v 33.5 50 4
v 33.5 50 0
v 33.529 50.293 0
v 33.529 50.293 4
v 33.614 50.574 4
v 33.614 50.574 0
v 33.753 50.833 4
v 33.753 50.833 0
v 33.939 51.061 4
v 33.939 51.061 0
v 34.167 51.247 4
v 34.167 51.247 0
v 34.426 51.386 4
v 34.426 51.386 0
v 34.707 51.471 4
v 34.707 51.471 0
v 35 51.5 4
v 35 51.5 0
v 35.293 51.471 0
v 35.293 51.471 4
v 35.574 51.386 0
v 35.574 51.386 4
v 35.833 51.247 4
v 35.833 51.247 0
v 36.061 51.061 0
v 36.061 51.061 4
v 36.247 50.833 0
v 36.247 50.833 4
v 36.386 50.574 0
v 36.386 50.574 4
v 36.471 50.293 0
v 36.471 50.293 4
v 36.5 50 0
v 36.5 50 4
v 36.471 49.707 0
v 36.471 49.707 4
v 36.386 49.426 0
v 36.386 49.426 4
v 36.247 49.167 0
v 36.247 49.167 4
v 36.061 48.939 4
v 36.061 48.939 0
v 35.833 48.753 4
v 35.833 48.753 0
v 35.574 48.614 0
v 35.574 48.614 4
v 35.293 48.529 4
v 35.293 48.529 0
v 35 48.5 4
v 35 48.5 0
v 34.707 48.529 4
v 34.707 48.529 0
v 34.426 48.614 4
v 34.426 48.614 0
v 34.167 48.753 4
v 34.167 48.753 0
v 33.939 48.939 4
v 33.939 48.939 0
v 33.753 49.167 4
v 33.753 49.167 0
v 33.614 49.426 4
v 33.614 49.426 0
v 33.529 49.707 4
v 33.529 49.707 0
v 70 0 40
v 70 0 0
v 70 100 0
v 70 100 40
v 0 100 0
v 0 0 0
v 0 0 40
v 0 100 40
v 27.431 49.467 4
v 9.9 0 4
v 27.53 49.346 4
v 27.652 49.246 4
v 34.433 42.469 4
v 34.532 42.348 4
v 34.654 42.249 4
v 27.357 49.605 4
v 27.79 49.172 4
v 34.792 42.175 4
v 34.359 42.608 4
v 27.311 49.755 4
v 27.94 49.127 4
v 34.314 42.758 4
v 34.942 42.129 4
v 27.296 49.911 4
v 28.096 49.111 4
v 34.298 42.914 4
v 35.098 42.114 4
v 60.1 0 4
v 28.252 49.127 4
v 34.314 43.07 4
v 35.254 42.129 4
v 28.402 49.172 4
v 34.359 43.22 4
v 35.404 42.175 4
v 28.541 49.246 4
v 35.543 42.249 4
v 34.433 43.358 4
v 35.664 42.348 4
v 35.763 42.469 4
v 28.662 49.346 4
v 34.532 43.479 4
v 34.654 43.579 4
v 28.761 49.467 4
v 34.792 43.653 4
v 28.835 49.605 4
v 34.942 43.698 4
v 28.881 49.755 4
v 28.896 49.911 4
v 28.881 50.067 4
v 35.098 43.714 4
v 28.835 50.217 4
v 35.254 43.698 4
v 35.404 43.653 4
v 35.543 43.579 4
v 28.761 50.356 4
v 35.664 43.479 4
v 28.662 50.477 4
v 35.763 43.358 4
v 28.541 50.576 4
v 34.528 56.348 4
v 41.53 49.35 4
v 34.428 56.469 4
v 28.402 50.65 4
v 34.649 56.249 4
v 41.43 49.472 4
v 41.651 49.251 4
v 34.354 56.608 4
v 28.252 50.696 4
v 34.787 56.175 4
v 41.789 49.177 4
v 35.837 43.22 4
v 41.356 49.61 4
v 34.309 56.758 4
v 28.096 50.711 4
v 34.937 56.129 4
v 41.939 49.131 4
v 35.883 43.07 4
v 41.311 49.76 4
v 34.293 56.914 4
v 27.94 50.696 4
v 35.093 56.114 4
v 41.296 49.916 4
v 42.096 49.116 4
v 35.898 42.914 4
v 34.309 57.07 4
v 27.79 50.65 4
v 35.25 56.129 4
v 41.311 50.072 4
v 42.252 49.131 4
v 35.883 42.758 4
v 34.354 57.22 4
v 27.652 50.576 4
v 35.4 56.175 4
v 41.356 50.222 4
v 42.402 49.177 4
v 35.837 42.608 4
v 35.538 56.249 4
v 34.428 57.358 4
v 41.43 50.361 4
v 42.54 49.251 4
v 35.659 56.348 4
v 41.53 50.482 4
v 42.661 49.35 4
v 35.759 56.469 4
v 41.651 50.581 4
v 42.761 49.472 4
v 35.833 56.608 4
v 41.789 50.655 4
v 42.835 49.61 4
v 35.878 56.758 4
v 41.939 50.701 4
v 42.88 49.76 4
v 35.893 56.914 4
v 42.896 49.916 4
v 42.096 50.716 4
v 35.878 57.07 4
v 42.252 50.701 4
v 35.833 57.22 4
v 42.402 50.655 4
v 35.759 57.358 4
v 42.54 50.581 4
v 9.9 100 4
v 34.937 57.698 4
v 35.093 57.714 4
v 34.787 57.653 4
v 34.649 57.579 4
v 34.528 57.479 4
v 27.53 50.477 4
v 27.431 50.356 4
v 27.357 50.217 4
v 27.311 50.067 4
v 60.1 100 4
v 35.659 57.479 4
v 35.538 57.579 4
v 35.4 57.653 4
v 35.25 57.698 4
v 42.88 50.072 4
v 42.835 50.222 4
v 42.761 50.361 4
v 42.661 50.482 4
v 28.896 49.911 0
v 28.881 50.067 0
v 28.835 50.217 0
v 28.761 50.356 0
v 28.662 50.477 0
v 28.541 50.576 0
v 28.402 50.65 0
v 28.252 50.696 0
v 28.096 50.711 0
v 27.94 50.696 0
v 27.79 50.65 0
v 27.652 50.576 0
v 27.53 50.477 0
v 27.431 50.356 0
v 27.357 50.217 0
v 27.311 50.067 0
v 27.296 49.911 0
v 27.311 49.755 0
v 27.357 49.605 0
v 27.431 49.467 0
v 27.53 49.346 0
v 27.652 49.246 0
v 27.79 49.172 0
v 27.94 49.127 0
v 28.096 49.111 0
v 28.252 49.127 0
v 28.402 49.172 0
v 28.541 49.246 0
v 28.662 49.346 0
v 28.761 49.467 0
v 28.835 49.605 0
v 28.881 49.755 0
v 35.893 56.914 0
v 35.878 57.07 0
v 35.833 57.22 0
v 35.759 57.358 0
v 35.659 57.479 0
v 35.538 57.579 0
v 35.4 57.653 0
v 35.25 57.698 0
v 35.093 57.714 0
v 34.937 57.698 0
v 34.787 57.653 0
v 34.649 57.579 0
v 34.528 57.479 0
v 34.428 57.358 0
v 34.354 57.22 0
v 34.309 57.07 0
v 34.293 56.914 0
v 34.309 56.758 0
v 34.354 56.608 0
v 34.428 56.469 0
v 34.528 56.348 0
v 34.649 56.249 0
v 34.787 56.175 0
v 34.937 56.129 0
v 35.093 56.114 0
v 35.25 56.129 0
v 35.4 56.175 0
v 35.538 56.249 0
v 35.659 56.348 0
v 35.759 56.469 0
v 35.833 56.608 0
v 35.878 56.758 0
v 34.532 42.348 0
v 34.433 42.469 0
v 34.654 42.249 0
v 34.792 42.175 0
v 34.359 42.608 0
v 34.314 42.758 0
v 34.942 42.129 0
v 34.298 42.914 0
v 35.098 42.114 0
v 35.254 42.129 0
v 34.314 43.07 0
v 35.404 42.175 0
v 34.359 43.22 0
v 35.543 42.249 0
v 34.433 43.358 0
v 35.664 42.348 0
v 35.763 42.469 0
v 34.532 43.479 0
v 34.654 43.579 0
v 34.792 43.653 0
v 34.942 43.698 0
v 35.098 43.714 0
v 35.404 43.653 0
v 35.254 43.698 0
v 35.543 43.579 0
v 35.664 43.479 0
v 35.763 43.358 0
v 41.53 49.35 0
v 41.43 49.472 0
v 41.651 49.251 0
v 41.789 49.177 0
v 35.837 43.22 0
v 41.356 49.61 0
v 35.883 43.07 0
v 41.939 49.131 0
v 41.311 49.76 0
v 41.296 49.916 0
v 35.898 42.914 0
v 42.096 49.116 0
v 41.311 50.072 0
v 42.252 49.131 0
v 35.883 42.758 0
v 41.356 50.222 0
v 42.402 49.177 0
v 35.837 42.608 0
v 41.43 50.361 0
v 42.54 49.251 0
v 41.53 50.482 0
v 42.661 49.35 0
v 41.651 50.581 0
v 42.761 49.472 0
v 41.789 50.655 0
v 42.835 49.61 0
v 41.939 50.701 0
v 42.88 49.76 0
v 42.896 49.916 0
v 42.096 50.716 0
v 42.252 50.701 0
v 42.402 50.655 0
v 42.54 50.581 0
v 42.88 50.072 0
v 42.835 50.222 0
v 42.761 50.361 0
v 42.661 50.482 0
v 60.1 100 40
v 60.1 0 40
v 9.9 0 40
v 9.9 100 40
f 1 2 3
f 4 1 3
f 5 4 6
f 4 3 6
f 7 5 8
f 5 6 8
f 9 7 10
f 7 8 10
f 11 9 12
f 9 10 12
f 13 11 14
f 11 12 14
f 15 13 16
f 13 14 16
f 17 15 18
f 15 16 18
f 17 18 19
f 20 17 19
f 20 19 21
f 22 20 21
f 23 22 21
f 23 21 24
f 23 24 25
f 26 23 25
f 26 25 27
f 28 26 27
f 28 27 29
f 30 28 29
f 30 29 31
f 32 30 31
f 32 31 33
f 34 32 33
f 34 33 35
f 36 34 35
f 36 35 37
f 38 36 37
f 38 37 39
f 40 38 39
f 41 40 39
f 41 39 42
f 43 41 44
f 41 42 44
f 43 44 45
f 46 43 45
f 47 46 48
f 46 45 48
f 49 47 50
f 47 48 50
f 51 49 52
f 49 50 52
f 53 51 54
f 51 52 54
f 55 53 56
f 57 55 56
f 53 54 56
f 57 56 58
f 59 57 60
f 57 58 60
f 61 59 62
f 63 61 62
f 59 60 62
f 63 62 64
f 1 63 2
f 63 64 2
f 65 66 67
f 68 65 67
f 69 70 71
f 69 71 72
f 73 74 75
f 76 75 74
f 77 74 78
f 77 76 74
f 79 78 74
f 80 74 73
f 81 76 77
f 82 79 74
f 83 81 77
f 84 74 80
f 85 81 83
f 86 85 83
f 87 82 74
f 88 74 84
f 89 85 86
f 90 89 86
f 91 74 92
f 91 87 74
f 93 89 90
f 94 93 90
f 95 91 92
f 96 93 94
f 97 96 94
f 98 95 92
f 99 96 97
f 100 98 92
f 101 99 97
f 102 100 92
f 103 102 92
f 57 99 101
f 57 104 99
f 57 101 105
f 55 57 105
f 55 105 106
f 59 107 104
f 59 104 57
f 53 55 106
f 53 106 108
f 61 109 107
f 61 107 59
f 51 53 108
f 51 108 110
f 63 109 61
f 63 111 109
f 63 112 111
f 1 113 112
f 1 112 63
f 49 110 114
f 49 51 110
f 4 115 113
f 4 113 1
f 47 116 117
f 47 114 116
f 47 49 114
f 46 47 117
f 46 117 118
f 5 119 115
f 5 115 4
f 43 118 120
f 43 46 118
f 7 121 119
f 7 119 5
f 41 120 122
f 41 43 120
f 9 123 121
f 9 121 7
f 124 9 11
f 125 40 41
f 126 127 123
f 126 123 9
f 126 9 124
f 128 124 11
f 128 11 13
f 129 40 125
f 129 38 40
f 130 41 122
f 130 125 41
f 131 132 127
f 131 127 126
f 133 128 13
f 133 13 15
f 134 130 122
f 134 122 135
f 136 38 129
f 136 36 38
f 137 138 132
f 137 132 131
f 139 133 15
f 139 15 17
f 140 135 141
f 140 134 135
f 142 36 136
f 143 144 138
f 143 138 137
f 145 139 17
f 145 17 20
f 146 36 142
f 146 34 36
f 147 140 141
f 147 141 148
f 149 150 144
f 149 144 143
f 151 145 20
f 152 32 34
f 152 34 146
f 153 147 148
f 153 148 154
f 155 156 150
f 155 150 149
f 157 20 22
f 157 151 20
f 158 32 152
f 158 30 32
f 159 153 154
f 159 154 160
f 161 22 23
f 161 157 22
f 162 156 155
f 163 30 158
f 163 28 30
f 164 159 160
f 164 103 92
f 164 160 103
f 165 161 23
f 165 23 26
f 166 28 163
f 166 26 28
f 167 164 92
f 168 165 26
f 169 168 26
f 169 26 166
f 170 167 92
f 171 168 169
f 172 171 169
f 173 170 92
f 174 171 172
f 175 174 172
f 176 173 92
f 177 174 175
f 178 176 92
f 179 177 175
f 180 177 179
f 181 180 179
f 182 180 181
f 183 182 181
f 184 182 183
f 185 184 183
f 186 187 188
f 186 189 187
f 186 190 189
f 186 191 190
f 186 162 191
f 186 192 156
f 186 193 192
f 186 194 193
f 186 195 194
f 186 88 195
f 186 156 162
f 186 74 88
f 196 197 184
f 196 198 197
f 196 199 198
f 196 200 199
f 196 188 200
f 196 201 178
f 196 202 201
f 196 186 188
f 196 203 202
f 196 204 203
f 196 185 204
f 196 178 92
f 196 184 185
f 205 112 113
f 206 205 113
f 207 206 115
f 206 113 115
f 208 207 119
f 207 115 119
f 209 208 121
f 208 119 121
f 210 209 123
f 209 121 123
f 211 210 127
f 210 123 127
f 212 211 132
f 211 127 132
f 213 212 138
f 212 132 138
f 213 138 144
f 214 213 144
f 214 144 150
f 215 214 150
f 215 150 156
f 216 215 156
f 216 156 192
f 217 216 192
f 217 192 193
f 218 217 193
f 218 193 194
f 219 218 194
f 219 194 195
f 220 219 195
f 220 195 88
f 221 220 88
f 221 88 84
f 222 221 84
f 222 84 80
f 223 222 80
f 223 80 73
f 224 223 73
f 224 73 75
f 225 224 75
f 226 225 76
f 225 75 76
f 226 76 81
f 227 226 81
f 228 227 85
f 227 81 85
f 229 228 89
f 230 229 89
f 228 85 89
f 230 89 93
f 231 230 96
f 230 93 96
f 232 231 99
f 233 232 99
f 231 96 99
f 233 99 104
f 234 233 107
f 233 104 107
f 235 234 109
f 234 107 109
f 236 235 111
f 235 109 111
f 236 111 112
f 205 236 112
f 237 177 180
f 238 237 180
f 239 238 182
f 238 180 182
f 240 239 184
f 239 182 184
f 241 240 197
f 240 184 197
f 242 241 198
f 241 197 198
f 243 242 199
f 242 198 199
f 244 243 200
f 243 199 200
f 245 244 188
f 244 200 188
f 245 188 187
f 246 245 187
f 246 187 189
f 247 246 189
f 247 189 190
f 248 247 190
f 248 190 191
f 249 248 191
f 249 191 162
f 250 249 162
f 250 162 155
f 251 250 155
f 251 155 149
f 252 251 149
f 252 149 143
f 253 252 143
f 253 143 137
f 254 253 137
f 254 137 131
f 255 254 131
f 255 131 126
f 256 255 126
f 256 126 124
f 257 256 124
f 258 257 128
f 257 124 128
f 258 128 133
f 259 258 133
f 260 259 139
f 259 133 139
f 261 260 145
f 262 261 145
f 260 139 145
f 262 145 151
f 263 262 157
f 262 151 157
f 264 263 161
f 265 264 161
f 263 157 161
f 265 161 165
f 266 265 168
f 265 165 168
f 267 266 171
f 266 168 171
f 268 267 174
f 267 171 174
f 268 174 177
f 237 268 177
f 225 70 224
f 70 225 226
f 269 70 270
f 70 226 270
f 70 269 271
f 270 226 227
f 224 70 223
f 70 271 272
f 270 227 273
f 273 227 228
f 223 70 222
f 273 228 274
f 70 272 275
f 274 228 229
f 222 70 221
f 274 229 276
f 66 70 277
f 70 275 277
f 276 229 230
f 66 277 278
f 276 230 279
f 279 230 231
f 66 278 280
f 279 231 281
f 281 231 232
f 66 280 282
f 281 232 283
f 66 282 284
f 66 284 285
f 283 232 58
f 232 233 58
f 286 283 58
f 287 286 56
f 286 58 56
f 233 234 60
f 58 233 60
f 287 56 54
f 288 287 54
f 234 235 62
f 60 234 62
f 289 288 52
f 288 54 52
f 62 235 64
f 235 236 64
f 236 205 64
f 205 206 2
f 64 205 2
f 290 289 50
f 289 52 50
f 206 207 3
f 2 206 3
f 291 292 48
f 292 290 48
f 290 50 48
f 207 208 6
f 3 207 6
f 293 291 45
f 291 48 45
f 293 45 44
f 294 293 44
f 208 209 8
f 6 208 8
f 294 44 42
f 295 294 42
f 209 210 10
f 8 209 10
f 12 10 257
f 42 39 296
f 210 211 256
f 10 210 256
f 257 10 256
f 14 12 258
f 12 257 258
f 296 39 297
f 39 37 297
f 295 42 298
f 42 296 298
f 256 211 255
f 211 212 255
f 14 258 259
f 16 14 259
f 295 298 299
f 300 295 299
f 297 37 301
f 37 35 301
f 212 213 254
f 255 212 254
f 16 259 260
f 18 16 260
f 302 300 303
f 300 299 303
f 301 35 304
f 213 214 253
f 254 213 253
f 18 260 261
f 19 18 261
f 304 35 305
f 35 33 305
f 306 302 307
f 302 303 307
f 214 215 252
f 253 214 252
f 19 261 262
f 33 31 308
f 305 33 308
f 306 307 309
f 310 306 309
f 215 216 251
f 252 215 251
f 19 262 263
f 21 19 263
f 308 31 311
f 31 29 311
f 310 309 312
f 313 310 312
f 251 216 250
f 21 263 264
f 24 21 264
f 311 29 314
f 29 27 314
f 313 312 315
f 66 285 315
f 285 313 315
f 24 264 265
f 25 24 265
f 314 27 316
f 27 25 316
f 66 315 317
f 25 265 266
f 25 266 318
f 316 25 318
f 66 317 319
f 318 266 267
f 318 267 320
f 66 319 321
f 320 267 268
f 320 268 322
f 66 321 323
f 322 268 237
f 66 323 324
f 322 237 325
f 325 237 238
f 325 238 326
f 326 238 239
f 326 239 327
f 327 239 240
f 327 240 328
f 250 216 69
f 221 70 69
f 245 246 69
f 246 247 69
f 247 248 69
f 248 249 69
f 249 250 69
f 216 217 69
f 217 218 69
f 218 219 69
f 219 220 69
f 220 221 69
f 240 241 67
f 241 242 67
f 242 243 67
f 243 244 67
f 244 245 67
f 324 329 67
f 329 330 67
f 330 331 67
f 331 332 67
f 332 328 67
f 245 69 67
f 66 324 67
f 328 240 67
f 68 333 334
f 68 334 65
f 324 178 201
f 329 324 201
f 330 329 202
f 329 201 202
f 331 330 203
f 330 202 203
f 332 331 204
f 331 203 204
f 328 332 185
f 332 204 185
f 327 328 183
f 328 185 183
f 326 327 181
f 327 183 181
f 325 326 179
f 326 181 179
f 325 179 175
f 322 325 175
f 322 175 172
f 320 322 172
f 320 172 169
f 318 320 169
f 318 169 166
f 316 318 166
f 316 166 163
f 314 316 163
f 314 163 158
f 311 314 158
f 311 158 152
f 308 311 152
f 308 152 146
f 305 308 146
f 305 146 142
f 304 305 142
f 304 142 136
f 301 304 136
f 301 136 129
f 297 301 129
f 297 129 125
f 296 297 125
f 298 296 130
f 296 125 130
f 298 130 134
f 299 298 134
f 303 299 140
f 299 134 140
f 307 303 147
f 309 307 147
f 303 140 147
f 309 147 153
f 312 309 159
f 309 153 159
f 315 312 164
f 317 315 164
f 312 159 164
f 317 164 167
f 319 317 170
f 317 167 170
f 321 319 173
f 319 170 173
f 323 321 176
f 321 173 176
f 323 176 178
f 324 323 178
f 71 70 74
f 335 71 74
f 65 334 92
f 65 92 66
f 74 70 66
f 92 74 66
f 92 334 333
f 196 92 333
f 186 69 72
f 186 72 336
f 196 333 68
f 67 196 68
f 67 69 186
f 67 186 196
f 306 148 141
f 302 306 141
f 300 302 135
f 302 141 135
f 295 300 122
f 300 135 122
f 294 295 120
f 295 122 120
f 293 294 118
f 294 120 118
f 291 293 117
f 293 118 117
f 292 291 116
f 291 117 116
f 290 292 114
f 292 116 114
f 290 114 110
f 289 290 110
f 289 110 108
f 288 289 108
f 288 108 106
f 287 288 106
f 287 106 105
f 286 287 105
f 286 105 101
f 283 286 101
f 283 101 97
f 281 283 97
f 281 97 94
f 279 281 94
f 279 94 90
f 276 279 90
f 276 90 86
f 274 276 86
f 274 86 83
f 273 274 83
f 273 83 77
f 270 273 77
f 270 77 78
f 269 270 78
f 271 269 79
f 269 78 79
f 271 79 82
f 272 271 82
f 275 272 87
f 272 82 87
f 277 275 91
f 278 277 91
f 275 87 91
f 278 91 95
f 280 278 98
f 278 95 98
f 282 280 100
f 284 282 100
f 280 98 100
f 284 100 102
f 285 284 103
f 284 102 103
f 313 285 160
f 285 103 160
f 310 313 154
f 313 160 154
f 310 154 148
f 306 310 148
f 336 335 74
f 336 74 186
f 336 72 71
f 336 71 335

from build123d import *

# Parameters (mm, degrees)
SKETCH_1_W          = 70
SKETCH_1_H          = 100
EXTRUDE_1_DEPTH     = 40
SKETCH_2_W          = 50.2
SKETCH_2_H          = 100
CUT_EXTRUDE_1_DEPTH = 36
CUT_EXTRUDE_2_REACH = 130.452
SKETCH_3_R          = 1.5
CUT_EXTRUDE_4_REACH = 129.264
SKETCH_6_R          = 0.799974648
SKETCH_6_R_2        = 0.799973527
SKETCH_6_R_3        = 0.799971754
SKETCH_6_R_4        = 0.799972464


with BuildPart() as part:
    # 草图1 → 凸台-拉伸1 (new body)
    with BuildSketch(Plane.XY):
        with Locations((35, 50)):
            Rectangle(SKETCH_1_W, SKETCH_1_H)
    extrude(amount=EXTRUDE_1_DEPTH)

    # 草图2 → 切除-拉伸1 (cut)
    with BuildSketch(Plane.XY.offset(40)):
        with Locations((35, 50)):
            Rectangle(SKETCH_2_W, SKETCH_2_H)
    extrude(amount=-CUT_EXTRUDE_1_DEPTH, mode=Mode.SUBTRACT)

    # 草图3 → 切除-拉伸2 (cut, up to next)
    with BuildSketch(Plane(origin=(0, 0, 0), x_dir=(-1, 0, 0), z_dir=(0, 0, -1)), mode=Mode.PRIVATE) as cut_extrude_2_sk1:
        with Locations((-35, 50)):
            Circle(SKETCH_3_R)
    cut_extrude_2_tool1 = extrude(cut_extrude_2_sk1.sketch, amount=-CUT_EXTRUDE_2_REACH, mode=Mode.PRIVATE) & part.part
    add(cut_extrude_2_tool1.solids().sort_by_distance((35, 50, 0))[0], mode=Mode.SUBTRACT)

    # 草图6 → 切除-拉伸4 (cut, up to next)
    with BuildSketch(Plane.XY.offset(4), mode=Mode.PRIVATE) as cut_extrude_4_sk1:
        with Locations((35.098154463, 42.913706308)):
            Circle(SKETCH_6_R)
    cut_extrude_4_tool1 = extrude(cut_extrude_4_sk1.sketch, amount=-CUT_EXTRUDE_4_REACH, mode=Mode.PRIVATE) & part.part
    # 草图6 → 切除-拉伸4 (cut, up to next)
    with BuildSketch(Plane.XY.offset(4), mode=Mode.PRIVATE) as cut_extrude_4_sk2:
        with Locations((28.096062907, 49.911346021)):
            Circle(SKETCH_6_R_2)
    cut_extrude_4_tool2 = extrude(cut_extrude_4_sk2.sketch, amount=-CUT_EXTRUDE_4_REACH, mode=Mode.PRIVATE) & part.part
    # 草图6 → 切除-拉伸4 (cut, up to next)
    with BuildSketch(Plane.XY.offset(4), mode=Mode.PRIVATE) as cut_extrude_4_sk3:
        with Locations((35.09343748, 56.91370551)):
            Circle(SKETCH_6_R_3)
    cut_extrude_4_tool3 = extrude(cut_extrude_4_sk3.sketch, amount=-CUT_EXTRUDE_4_REACH, mode=Mode.PRIVATE) & part.part
    # 草图6 → 切除-拉伸4 (cut, up to next)
    with BuildSketch(Plane.XY.offset(4), mode=Mode.PRIVATE) as cut_extrude_4_sk4:
        with Locations((42.095529036, 49.916065797)):
            Circle(SKETCH_6_R_4)
    cut_extrude_4_tool4 = extrude(cut_extrude_4_sk4.sketch, amount=-CUT_EXTRUDE_4_REACH, mode=Mode.PRIVATE) & part.part
    add(cut_extrude_4_tool1.solids().sort_by_distance((35.098154, 42.913706, 4))[0], mode=Mode.SUBTRACT)
    add(cut_extrude_4_tool2.solids().sort_by_distance((28.096063, 49.911346, 4))[0], mode=Mode.SUBTRACT)
    add(cut_extrude_4_tool3.solids().sort_by_distance((35.093437, 56.913706, 4))[0], mode=Mode.SUBTRACT)
    add(cut_extrude_4_tool4.solids().sort_by_distance((42.095529, 49.916066, 4))[0], mode=Mode.SUBTRACT)


solid = part.part
